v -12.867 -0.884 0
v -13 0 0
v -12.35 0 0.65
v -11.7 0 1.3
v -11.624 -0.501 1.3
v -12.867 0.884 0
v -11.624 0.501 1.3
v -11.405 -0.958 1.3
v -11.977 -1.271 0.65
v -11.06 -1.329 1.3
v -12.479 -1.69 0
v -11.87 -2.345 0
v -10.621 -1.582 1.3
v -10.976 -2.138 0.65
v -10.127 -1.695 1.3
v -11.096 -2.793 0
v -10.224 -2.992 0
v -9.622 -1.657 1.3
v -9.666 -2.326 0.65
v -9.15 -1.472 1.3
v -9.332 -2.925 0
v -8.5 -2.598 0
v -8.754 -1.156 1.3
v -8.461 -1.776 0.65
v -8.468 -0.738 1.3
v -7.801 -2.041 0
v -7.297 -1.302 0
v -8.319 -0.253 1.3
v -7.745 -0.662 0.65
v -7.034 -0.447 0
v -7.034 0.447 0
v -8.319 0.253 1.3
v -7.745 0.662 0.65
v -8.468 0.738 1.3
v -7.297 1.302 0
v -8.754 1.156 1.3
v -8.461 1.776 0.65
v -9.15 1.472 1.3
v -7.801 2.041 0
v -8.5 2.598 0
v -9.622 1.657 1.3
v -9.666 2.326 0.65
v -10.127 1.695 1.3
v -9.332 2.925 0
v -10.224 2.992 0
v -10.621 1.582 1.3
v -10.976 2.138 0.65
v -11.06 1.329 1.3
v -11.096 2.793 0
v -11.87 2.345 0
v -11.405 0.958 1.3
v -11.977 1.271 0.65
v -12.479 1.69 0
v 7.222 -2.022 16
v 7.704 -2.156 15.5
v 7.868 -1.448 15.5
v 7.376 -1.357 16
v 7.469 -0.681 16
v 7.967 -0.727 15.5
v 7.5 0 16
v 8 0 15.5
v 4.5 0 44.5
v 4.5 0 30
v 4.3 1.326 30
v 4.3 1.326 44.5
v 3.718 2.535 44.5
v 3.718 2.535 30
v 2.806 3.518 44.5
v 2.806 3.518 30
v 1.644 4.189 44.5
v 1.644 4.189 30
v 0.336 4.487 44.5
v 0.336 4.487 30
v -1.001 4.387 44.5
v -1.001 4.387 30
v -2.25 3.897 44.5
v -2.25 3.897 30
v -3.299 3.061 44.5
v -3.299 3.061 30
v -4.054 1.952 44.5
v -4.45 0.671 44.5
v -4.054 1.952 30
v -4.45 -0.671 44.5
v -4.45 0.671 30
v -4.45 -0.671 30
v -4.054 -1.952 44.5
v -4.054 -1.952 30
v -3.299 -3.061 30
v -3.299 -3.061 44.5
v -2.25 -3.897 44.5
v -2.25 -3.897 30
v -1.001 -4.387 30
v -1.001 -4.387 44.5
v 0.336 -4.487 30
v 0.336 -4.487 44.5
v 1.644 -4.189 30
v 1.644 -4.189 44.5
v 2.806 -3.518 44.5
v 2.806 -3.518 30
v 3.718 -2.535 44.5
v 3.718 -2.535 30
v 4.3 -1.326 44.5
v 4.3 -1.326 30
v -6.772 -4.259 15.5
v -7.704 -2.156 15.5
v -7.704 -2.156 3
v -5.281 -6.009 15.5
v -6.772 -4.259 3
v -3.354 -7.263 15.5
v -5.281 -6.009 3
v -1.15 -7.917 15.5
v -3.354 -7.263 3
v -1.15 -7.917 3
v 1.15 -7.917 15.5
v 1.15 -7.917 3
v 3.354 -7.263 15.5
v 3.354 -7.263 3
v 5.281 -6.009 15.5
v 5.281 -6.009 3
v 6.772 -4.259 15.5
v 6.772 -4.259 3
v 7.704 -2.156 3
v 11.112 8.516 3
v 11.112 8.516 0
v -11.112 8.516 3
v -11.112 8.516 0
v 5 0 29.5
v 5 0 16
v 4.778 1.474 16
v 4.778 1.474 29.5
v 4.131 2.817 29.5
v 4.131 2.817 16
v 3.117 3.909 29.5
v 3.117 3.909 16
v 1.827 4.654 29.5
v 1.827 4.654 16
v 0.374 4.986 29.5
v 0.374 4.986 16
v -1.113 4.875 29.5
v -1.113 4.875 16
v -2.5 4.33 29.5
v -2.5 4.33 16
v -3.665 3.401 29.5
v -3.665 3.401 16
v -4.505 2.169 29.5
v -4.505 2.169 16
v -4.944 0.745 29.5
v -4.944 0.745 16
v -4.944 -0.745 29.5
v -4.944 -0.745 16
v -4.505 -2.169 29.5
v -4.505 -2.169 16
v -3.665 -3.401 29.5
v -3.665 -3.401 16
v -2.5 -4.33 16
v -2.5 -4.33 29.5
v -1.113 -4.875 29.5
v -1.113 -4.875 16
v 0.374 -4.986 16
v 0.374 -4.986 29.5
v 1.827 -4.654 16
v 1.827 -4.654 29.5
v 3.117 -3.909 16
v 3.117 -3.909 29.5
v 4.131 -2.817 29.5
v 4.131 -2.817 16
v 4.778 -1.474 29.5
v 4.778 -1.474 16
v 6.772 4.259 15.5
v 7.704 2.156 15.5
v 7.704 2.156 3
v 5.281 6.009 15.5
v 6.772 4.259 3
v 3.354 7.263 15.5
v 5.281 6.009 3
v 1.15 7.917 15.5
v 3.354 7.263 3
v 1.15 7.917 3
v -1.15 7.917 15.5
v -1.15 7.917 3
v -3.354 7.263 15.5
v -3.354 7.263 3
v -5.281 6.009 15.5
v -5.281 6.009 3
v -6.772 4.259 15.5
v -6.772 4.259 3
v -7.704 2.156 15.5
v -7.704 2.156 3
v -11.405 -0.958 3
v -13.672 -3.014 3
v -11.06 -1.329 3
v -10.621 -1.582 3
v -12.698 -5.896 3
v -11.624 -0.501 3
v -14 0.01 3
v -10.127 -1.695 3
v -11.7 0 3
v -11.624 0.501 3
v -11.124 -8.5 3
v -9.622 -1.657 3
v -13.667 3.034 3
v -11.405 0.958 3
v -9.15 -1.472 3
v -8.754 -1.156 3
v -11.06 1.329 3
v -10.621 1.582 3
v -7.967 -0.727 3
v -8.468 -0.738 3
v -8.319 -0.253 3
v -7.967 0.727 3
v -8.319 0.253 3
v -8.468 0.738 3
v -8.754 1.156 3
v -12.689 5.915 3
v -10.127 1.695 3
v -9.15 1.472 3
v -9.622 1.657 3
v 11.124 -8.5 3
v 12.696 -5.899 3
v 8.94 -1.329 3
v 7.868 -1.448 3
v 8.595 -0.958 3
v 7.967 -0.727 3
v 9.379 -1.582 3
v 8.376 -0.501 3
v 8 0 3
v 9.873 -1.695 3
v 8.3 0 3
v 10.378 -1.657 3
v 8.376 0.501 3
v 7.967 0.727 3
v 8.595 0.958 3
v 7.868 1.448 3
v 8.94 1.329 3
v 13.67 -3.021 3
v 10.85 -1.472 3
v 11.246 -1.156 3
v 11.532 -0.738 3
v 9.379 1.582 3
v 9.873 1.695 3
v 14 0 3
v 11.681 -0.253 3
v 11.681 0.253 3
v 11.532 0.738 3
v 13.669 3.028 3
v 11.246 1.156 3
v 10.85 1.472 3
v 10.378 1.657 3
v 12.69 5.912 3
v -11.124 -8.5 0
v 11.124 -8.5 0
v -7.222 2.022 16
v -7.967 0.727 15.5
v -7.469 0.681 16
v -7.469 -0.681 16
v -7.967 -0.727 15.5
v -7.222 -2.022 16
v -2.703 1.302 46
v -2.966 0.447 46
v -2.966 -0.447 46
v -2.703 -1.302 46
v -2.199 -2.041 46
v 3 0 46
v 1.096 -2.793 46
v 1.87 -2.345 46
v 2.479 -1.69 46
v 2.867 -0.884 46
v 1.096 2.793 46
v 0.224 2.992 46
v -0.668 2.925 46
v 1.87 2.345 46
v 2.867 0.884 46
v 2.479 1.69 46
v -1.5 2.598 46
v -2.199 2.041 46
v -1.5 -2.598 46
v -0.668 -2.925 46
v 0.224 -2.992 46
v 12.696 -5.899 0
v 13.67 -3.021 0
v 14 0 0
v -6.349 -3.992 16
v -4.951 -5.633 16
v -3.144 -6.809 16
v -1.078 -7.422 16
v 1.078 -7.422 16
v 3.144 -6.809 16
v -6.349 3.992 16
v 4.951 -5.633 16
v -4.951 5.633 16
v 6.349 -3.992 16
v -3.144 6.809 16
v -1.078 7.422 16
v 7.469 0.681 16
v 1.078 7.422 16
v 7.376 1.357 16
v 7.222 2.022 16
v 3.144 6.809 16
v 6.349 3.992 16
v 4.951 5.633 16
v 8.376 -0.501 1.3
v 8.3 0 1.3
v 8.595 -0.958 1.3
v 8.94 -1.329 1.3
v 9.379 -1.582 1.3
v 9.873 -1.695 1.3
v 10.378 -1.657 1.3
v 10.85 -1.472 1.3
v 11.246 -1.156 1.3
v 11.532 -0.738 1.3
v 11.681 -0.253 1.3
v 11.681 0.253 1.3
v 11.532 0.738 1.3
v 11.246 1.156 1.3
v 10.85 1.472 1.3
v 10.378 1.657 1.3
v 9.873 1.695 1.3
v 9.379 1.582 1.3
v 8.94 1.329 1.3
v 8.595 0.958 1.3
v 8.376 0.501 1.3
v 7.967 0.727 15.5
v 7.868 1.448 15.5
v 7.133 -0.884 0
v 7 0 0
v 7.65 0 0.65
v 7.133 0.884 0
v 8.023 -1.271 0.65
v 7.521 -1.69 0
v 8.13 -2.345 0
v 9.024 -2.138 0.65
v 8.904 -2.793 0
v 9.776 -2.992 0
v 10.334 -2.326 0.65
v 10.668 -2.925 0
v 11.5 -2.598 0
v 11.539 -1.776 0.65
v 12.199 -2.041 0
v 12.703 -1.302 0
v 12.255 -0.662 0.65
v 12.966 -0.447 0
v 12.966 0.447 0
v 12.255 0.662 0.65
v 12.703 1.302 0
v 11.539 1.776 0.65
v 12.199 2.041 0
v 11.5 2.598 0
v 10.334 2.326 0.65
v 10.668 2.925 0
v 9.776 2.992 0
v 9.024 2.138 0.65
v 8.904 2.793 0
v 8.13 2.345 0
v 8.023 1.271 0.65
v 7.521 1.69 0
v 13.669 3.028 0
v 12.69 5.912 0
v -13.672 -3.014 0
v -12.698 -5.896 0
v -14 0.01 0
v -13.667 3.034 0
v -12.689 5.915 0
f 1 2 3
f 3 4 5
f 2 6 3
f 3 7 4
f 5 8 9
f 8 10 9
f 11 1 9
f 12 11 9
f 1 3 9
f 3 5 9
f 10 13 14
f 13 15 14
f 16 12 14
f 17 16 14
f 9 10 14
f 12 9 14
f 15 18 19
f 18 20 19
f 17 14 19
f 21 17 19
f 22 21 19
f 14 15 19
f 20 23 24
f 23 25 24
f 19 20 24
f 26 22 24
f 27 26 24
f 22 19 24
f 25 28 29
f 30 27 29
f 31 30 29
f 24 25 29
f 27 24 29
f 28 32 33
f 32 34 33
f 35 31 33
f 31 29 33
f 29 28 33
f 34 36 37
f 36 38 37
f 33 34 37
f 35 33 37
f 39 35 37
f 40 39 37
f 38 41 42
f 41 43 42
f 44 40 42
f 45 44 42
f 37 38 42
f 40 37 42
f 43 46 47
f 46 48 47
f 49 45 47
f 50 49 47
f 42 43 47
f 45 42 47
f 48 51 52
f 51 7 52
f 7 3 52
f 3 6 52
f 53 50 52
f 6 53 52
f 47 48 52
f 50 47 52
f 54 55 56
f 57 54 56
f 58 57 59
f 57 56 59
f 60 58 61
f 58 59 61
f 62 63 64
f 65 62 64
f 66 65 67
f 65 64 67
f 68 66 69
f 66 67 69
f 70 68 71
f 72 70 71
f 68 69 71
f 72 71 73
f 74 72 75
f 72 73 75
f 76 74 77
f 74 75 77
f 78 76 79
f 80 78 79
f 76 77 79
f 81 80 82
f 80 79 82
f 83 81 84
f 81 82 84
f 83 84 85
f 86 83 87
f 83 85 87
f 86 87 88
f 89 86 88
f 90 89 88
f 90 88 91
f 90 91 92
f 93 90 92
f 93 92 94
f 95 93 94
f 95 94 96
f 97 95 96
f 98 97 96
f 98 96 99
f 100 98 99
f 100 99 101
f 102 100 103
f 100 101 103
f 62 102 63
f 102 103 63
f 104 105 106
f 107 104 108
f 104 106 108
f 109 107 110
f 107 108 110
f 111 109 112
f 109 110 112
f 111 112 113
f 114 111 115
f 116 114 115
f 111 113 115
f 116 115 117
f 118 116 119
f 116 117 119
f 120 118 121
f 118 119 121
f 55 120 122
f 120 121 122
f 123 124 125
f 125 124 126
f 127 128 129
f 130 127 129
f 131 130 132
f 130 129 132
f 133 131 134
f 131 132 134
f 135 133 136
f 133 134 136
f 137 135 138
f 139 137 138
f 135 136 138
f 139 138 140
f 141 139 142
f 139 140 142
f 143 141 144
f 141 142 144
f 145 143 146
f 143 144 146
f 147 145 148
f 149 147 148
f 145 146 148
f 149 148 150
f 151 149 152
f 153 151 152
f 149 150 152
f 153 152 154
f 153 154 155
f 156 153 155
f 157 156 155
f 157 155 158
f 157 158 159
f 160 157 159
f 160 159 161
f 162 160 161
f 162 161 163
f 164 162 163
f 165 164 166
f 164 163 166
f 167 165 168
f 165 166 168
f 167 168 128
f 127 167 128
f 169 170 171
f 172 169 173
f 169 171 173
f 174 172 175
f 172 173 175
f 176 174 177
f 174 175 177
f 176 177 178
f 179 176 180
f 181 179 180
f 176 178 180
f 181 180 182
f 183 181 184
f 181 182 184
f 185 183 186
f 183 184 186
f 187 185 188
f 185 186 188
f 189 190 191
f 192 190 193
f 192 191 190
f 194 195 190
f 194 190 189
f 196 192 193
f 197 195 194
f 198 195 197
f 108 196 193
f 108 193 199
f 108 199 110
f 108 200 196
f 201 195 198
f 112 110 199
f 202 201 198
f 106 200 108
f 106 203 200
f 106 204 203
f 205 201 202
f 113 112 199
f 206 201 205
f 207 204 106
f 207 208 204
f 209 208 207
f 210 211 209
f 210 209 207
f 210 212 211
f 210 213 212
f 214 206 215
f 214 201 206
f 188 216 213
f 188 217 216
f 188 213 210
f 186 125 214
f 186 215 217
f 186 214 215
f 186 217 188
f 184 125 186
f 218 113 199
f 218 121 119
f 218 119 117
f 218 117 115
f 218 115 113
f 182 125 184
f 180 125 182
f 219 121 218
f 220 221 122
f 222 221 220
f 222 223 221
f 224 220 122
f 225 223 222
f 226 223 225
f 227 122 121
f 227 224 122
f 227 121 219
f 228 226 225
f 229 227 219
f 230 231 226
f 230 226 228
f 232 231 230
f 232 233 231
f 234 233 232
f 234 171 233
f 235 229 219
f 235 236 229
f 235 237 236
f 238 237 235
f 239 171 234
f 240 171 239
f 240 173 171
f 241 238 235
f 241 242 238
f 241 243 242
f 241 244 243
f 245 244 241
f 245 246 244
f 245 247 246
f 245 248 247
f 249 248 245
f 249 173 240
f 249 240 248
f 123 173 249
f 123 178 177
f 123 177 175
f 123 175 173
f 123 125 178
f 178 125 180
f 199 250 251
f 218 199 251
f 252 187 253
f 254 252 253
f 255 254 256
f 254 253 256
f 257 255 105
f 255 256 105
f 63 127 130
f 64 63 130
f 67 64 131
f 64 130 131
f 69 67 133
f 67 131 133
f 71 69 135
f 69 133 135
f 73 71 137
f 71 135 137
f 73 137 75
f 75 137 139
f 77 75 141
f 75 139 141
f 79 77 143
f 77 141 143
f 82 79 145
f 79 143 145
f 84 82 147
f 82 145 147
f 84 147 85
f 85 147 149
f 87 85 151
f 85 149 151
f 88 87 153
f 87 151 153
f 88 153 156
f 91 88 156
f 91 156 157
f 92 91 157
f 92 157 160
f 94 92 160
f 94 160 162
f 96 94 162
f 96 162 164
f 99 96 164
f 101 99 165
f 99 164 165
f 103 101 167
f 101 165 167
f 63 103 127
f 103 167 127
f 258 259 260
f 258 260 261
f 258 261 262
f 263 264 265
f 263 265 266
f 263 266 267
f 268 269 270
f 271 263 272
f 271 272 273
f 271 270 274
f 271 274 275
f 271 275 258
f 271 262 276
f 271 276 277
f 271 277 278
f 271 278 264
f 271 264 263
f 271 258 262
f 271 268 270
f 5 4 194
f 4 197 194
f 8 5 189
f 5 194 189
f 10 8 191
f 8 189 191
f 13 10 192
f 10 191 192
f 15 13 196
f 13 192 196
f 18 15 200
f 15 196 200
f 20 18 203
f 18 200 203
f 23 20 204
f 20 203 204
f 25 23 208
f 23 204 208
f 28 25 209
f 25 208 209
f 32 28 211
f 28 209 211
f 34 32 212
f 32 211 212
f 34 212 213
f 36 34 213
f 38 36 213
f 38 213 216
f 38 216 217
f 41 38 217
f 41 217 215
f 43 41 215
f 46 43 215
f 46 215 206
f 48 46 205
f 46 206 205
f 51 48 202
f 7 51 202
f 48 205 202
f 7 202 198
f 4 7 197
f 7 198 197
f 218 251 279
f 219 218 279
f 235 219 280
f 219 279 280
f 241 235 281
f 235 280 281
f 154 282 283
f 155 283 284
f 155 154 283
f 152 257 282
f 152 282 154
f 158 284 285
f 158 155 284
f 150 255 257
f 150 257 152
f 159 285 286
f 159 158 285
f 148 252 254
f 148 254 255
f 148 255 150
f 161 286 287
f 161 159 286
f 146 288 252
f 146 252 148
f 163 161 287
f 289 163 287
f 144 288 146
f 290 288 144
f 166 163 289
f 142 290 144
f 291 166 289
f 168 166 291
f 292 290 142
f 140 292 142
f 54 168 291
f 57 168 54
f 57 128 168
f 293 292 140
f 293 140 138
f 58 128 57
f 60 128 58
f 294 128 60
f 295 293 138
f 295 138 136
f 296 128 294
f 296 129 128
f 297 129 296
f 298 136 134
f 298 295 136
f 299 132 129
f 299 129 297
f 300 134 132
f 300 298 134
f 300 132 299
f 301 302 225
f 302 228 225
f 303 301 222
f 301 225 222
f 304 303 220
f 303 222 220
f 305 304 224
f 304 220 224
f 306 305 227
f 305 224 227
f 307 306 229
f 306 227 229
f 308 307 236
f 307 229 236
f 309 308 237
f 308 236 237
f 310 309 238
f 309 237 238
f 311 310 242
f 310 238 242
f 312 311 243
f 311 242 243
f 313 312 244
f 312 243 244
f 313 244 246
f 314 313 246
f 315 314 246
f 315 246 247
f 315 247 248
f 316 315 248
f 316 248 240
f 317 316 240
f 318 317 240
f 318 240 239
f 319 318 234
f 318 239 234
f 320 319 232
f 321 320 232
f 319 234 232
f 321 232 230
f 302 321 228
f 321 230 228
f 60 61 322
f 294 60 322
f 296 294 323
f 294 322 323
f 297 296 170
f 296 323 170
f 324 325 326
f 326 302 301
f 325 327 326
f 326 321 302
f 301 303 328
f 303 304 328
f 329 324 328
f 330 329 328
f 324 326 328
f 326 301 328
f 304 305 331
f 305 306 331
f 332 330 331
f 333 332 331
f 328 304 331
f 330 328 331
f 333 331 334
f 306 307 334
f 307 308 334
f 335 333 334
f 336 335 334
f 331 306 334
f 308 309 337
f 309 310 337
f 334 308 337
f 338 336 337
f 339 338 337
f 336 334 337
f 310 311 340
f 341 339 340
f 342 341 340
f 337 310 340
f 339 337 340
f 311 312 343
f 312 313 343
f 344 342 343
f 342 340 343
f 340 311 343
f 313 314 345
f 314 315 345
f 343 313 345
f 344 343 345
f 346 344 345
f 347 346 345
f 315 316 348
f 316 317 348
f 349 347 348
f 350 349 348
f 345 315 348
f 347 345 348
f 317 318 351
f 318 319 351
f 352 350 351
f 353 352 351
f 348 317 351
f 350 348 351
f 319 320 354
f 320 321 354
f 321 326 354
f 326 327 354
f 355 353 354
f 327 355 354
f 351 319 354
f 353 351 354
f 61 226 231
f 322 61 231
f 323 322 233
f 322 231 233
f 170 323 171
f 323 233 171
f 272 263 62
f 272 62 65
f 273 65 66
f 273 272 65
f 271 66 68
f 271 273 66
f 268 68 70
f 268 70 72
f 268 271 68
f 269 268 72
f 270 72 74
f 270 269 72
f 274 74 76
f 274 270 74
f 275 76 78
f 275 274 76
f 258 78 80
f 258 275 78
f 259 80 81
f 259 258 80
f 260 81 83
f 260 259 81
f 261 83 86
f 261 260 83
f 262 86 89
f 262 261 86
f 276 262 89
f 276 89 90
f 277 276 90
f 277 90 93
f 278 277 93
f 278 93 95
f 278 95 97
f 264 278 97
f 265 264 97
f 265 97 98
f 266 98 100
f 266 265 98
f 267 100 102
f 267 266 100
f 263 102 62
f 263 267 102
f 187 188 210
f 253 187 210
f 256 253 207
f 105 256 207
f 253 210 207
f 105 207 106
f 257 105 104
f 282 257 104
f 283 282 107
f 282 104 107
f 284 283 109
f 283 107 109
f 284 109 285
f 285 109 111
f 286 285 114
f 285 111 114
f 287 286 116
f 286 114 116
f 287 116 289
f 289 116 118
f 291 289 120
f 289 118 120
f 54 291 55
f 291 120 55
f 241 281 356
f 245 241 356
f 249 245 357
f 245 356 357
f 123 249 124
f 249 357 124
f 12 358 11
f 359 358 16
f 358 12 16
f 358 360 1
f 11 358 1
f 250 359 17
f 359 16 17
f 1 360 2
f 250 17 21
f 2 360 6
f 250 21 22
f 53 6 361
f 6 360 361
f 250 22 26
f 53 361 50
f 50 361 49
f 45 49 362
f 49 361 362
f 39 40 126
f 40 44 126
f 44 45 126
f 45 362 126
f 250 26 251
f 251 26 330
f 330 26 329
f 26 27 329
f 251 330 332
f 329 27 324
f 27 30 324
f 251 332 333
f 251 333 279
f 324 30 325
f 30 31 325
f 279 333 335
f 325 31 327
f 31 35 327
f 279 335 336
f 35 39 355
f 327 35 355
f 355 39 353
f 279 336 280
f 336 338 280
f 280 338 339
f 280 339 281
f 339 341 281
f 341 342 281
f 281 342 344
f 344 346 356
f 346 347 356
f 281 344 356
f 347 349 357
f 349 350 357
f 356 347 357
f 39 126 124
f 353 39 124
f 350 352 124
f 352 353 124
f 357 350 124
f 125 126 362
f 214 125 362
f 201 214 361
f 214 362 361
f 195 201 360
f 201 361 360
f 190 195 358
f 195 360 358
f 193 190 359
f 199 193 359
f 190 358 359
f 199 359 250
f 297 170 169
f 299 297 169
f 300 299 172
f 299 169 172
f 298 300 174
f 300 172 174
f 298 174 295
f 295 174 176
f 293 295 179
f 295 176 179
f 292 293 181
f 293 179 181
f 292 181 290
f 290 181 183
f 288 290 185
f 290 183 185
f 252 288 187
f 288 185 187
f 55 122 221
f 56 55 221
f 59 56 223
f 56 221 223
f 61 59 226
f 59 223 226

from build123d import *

# Parameters (mm, degrees)
F1_DEPTH        = 3
F2_DEPTH        = 16
F3_R            = 5
F4_DEPTH        = 14
F5_R            = 4.5
F6_DEPTH        = 16
F7_SIZE         = 1.5
F8_SIZE         = 0.49999
F9_D            = 3.4
F9_CSINK_D      = 6
F9_CSINK_ANGLE  = 90
F10_D           = 3.4
F10_CSINK_D     = 6
F10_CSINK_ANGLE = 90


# Not quite as in the source:
# - a fillet or chamfer is up to 0.001 mm smaller than in the source, because OpenCascade refuses the exact size


with BuildPart() as f1:
    # F0 (on Top) → F1 (new body)
    with BuildSketch(Plane.XY):
        with BuildLine():
            ThreePointArc((9.503875, 3.1106848096), (7.8523539336, 6.1919736516), (5.2411289459, 8.5164879717))
            Line((5.2411289459, 8.5164879717), (-5.2411289459, 8.5164879717))
            ThreePointArc((-5.2411289459, 8.5164879717), (-7.8523539336, 6.1919736516), (-9.503875, 3.1106848096))
            ThreePointArc((-9.503875, 3.1106848096), (-8.5246009554, 2.7831093509), (-7.703875, 2.15645774))
            ThreePointArc((-7.703875, 2.15645774), (0, 8), (7.703875, 2.15645774))
            ThreePointArc((7.703875, 2.15645774), (8.5246009554, 2.7831093509), (9.503875, 3.1106848096))
        make_face()
        with BuildLine():
            ThreePointArc((-7.703875, 2.15645774), (-8.5246009554, 2.7831093509), (-9.503875, 3.1106848096))
            ThreePointArc((-9.503875, 3.1106848096), (-9.705576078, 2.4086911373), (-9.8555, 1.6938476171))
            ThreePointArc((-9.8555, 1.6938476171), (-8.7478718117, 1.149858687), (-8.3, 0))
            ThreePointArc((-8.3, 0), (-8.7478718117, -1.149858687), (-9.8555, -1.6938476171))
            ThreePointArc((-9.8555, -1.6938476171), (-9.705576078, -2.4086911373), (-9.503875, -3.1106848096))
            ThreePointArc((-9.503875, -3.1106848096), (-8.5246009554, -2.7831093509), (-7.703875, -2.15645774))
            ThreePointArc((-7.703875, -2.15645774), (-8, 0), (-7.703875, 2.15645774))
        make_face()
        with BuildLine():
            ThreePointArc((-8.3, 0), (-8.7478718117, 1.149858687), (-9.8555, 1.6938476171))
            ThreePointArc((-9.8555, 1.6938476171), (-10, 0), (-9.8555, -1.6938476171))
            ThreePointArc((-9.8555, -1.6938476171), (-8.7478718117, -1.149858687), (-8.3, 0))
        make_face()
        with BuildLine():
            ThreePointArc((-9.8555, -1.6938476171), (-10, 0), (-9.8555, 1.6938476171))
            ThreePointArc((-9.8555, 1.6938476171), (-11.7, 0), (-9.8555, -1.6938476171))
        make_face()
        with BuildLine():
            ThreePointArc((-9.8555, 1.6938476171), (-9.705576078, 2.4086911373), (-9.503875, 3.1106848096))
            ThreePointArc((-9.503875, 3.1106848096), (-13.15, 0), (-9.503875, -3.1106848096))
            ThreePointArc((-9.503875, -3.1106848096), (-9.705576078, -2.4086911373), (-9.8555, -1.6938476171))
            ThreePointArc((-9.8555, -1.6938476171), (-11.7, 0), (-9.8555, 1.6938476171))
        make_face()
        with BuildLine():
            Line((-5.2411289459, 8.5164879717), (-11.1116800092, 8.5164879717))
            ThreePointArc((-11.1116800092, 8.5164879717), (-13.9999961512, 0.0103809935), (-11.1242977306, -8.5))
            Line((-11.1242977306, -8.5), (-5.2678268764, -8.5))
            ThreePointArc((-5.2678268764, -8.5), (-7.8620591219, -6.1796461357), (-9.503875, -3.1106848096))
            ThreePointArc((-9.503875, -3.1106848096), (-13.15, 0), (-9.503875, 3.1106848096))
            ThreePointArc((-9.503875, 3.1106848096), (-7.8523539336, 6.1919736516), (-5.2411289459, 8.5164879717))
        make_face()
        with BuildLine():
            ThreePointArc((11.1242977306, -8.5), (13.2616018683, -4.486637481), (14, 0))
            ThreePointArc((14, 0), (13.258271383, 4.4964697192), (11.1116800092, 8.5164879717))
            Line((11.1116800092, 8.5164879717), (5.2411289459, 8.5164879717))
            ThreePointArc((5.2411289459, 8.5164879717), (7.8523539336, 6.1919736516), (9.503875, 3.1106848096))
            ThreePointArc((9.503875, 3.1106848096), (12.0444689103, 2.3963820386), (13.15, 0))
            ThreePointArc((13.15, 0), (12.0444689103, -2.3963820386), (9.503875, -3.1106848096))
            ThreePointArc((9.503875, -3.1106848096), (7.8620591219, -6.1796461357), (5.2678268764, -8.5))
            Line((5.2678268764, -8.5), (11.1242977306, -8.5))
        make_face()
        with BuildLine():
            ThreePointArc((11.7, 0), (11.149858687, 1.2521281883), (9.8555, 1.6938476171))
            ThreePointArc((9.8555, 1.6938476171), (9.9638095124, 0.85), (10, 0))
            ThreePointArc((10, 0), (9.9638095124, -0.85), (9.8555, -1.6938476171))
            ThreePointArc((9.8555, -1.6938476171), (11.149858687, -1.2521281883), (11.7, 0))
        make_face()
        with BuildLine():
            ThreePointArc((13.15, 0), (12.0444689103, 2.3963820386), (9.503875, 3.1106848096))
            ThreePointArc((9.503875, 3.1106848096), (9.705576078, 2.4086911373), (9.8555, 1.6938476171))
            ThreePointArc((9.8555, 1.6938476171), (11.149858687, 1.2521281883), (11.7, 0))
            ThreePointArc((11.7, 0), (11.149858687, -1.2521281883), (9.8555, -1.6938476171))
            ThreePointArc((9.8555, -1.6938476171), (9.705576078, -2.4086911373), (9.503875, -3.1106848096))
            ThreePointArc((9.503875, -3.1106848096), (12.0444689103, -2.3963820386), (13.15, 0))
        make_face()
        with BuildLine():
            ThreePointArc((10, 0), (9.9638095124, 0.85), (9.8555, 1.6938476171))
            ThreePointArc((9.8555, 1.6938476171), (8.3, 0), (9.8555, -1.6938476171))
            ThreePointArc((9.8555, -1.6938476171), (9.9638095124, -0.85), (10, 0))
        make_face()
        with BuildLine():
            ThreePointArc((9.8555, 1.6938476171), (9.705576078, 2.4086911373), (9.503875, 3.1106848096))
            ThreePointArc((9.503875, 3.1106848096), (8.5246009554, 2.7831093509), (7.703875, 2.15645774))
            ThreePointArc((7.703875, 2.15645774), (7.9256230039, 1.088347371), (8, 0))
            ThreePointArc((8, 0), (7.9256230039, -1.088347371), (7.703875, -2.15645774))
            ThreePointArc((7.703875, -2.15645774), (8.5246009554, -2.7831093509), (9.503875, -3.1106848096))
            ThreePointArc((9.503875, -3.1106848096), (9.705576078, -2.4086911373), (9.8555, -1.6938476171))
            ThreePointArc((9.8555, -1.6938476171), (8.3, 0), (9.8555, 1.6938476171))
        make_face()
        with BuildLine():
            Line((-5.2678268764, -8.5), (5.2678268764, -8.5))
            ThreePointArc((5.2678268764, -8.5), (7.8620591219, -6.1796461357), (9.503875, -3.1106848096))
            ThreePointArc((9.503875, -3.1106848096), (8.5246009554, -2.7831093509), (7.703875, -2.15645774))
            ThreePointArc((7.703875, -2.15645774), (0, -8), (-7.703875, -2.15645774))
            ThreePointArc((-7.703875, -2.15645774), (-8.5246009554, -2.7831093509), (-9.503875, -3.1106848096))
            ThreePointArc((-9.503875, -3.1106848096), (-7.8620591219, -6.1796461357), (-5.2678268764, -8.5))
        make_face()
        with BuildLine():
            ThreePointArc((7.703875, -2.15645774), (6.85, 0), (7.703875, 2.15645774))
            ThreePointArc((7.703875, 2.15645774), (0, 8), (-7.703875, 2.15645774))
            ThreePointArc((-7.703875, 2.15645774), (-7.0712379962, 1.1596780264), (-6.85, 0))
            ThreePointArc((-6.85, 0), (-7.0712379962, -1.1596780264), (-7.703875, -2.15645774))
            ThreePointArc((-7.703875, -2.15645774), (0, -8), (7.703875, -2.15645774))
        make_face()
        with BuildLine():
            ThreePointArc((8, 0), (7.9256230039, 1.088347371), (7.703875, 2.15645774))
            ThreePointArc((7.703875, 2.15645774), (6.85, 0), (7.703875, -2.15645774))
            ThreePointArc((7.703875, -2.15645774), (7.9256230039, -1.088347371), (8, 0))
        make_face()
        with BuildLine():
            ThreePointArc((-6.85, 0), (-7.0712379962, 1.1596780264), (-7.703875, 2.15645774))
            ThreePointArc((-7.703875, 2.15645774), (-8, 0), (-7.703875, -2.15645774))
            ThreePointArc((-7.703875, -2.15645774), (-7.0712379962, -1.1596780264), (-6.85, 0))
        make_face()
    extrude(amount=F1_DEPTH)

    # F0 (on Top) → F2 (join)
    with BuildSketch(Plane.XY):
        with BuildLine():
            ThreePointArc((7.703875, -2.15645774), (6.85, 0), (7.703875, 2.15645774))
            ThreePointArc((7.703875, 2.15645774), (0, 8), (-7.703875, 2.15645774))
            ThreePointArc((-7.703875, 2.15645774), (-7.0712379962, 1.1596780264), (-6.85, 0))
            ThreePointArc((-6.85, 0), (-7.0712379962, -1.1596780264), (-7.703875, -2.15645774))
            ThreePointArc((-7.703875, -2.15645774), (0, -8), (7.703875, -2.15645774))
        make_face()
        with BuildLine():
            ThreePointArc((-6.85, 0), (-7.0712379962, 1.1596780264), (-7.703875, 2.15645774))
            ThreePointArc((-7.703875, 2.15645774), (-8, 0), (-7.703875, -2.15645774))
            ThreePointArc((-7.703875, -2.15645774), (-7.0712379962, -1.1596780264), (-6.85, 0))
        make_face()
        with BuildLine():
            ThreePointArc((8, 0), (7.9256230039, 1.088347371), (7.703875, 2.15645774))
            ThreePointArc((7.703875, 2.15645774), (6.85, 0), (7.703875, -2.15645774))
            ThreePointArc((7.703875, -2.15645774), (7.9256230039, -1.088347371), (8, 0))
        make_face()
    extrude(amount=F2_DEPTH)

    # F3 (on face) → F4 (join)
    with BuildSketch(Plane.XY.offset(16)):
        Circle(F3_R)
    extrude(amount=F4_DEPTH)

    # F5 (on face) → F6 (join)
    with BuildSketch(Plane.XY.offset(30)):
        Circle(F5_R)
    extrude(amount=F6_DEPTH)

    # F7
    f7_edges = [f1.edges().sort_by_distance(p)[0] for p in [
        (-4.5, 0, 46),
    ]]
    chamfer(f7_edges, length=F7_SIZE)

    # F8 (size 0.5 in the source; OpenCascade refuses exactly that, so slightly less here)
    f8_edges = [f1.edges().sort_by_distance(p)[0] for p in [
        (-7.703875, 2.156458, 16),
        (-5, 0, 30),
    ]]
    chamfer(f8_edges, length=F8_SIZE)

    # F9 (through all)
    with Locations(Plane(origin=(0, 0, 0), x_dir=(1, 0, 0), z_dir=(0, 0, -1))):
        with Locations((10, 0)):
            CounterSinkHole(F9_D / 2, F9_CSINK_D / 2, counter_sink_angle=F9_CSINK_ANGLE)

    # F10 (through all)
    with Locations(Plane(origin=(0, 0, 0), x_dir=(1, 0, 0), z_dir=(0, 0, -1))):
        with Locations((-10, 0)):
            CounterSinkHole(F10_D / 2, F10_CSINK_D / 2, counter_sink_angle=F10_CSINK_ANGLE)


solid = f1.part
